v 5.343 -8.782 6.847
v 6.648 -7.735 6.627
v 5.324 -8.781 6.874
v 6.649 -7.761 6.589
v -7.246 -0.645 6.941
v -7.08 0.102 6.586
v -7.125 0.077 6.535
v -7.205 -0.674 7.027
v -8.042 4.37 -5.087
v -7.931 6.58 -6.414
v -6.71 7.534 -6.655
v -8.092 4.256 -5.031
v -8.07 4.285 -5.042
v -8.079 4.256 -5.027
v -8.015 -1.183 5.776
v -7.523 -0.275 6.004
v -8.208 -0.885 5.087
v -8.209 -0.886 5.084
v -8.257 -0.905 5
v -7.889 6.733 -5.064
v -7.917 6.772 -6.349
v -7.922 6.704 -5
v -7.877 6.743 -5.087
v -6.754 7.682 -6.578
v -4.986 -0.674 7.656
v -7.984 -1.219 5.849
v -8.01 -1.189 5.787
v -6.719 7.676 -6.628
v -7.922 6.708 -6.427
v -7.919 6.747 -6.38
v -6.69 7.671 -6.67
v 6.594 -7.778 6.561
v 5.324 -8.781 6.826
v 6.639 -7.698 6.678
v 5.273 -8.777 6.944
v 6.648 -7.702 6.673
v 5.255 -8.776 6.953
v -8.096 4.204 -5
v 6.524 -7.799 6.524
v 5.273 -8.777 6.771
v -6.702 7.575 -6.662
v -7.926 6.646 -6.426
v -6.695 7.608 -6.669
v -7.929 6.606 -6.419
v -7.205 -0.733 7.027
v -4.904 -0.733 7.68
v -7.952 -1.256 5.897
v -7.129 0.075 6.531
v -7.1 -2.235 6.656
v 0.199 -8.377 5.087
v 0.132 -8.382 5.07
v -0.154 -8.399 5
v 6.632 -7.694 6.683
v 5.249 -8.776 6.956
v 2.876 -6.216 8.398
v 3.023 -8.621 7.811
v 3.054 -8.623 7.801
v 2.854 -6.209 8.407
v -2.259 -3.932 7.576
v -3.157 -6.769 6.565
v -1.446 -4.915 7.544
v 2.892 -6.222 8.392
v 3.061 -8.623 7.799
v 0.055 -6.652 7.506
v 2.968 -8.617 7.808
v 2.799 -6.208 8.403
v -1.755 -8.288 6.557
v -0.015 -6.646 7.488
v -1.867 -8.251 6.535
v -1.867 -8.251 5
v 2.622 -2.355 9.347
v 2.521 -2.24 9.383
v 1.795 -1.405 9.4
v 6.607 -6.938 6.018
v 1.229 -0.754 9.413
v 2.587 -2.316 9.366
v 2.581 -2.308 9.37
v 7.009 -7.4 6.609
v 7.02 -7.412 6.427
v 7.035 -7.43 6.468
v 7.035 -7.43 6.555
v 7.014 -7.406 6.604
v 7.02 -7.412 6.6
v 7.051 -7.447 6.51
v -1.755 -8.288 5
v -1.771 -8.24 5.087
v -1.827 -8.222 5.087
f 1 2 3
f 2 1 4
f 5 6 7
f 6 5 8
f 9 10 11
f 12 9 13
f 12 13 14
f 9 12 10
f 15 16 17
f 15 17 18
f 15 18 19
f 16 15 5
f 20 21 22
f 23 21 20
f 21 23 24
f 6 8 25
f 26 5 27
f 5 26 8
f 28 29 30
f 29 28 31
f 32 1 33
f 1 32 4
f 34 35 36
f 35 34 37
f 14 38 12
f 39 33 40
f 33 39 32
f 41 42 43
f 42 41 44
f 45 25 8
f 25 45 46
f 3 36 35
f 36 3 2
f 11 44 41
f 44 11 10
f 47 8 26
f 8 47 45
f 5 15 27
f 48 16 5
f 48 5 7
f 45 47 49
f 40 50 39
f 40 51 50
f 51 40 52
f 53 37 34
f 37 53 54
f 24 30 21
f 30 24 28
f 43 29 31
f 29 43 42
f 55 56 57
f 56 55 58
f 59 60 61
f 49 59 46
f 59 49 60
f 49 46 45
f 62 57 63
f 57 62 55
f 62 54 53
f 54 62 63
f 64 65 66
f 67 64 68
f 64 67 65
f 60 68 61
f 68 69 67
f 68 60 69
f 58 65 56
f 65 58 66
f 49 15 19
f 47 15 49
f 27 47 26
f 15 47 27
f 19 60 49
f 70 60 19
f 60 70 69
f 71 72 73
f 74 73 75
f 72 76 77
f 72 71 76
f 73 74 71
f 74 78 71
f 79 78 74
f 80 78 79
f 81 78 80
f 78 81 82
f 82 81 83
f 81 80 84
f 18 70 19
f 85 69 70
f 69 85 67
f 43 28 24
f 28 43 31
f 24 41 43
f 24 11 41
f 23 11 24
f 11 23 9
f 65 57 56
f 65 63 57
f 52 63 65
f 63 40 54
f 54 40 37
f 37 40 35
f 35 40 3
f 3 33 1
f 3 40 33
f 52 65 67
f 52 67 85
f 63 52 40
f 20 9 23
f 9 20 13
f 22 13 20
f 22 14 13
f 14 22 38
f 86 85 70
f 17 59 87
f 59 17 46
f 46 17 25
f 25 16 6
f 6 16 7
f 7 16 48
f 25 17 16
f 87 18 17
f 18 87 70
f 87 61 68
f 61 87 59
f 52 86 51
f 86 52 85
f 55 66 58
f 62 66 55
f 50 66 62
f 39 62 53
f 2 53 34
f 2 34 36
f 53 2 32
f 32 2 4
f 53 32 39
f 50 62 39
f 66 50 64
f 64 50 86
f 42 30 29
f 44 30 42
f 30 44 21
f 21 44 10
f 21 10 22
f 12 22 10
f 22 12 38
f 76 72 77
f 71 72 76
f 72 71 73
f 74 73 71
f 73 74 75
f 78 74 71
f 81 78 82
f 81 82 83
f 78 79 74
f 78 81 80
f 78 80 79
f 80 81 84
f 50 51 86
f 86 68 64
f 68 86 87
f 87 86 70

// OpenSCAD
// Auto-generated OpenSCAD file

    inner_points = 10*[[0.3549004973467511, -0.35521054808402747, -1.2071067811864837], [-0.30136407955047917, 0.39932030291538634, -1.2071067811866112], [0.3549004973463955, -0.3552105480839295, 1.2071067811866112], [-0.3013640795508348, 0.3993203029154843, 1.2071067811864837], [0.818949629923199, -0.8887444294401406, -0.4999999999998463], [-0.7654132121271353, 0.9328541842715569, -0.5000000000001537], [0.8189496299230516, -0.8887444294401, 0.5000000000001537], [-0.7654132121272826, 0.9328541842715975, 0.4999999999998463], [-0.178633384009495, -0.8192596806605508, -0.4999999999999961], [-0.8348979609067254, -0.06472882966113712, -0.5000000000001235], [-0.17863338400964232, -0.8192596806605101, 0.5000000000000039], [-0.8348979609068726, -0.06472882966109651, 0.49999999999987654]];

    outer_points = 10*[[1.2307668032340542, 0.4303553059775063, 0.08434552661867156], [1.0919099787017486, -0.4303553059775063, 0.574137344382946], [-1.0919099787017486, 0.4303553059775063, -0.574137344382946], [-1.2307668032340542, -0.4303553059775063, -0.08434552661867156], [0.6486571265504295, 1.0389696163301188, -0.4548547567133196], [0.3134270975364759, -1.0389696163301188, 0.7276072924725627], [-0.3134270975364759, 1.0389696163301188, -0.7276072924725627], [-0.6486571265504295, -1.0389696163301188, 0.4548547567133196], [0.3844694278615675, 0.7903395017889528, 0.47701858554126475], [0.24561260332926171, -0.07037111016605979, 0.9668104033055391], [-0.577614796225338, 0.7903395017889528, 0.20426604978202156], [-0.7164716207576437, -0.07037111016605979, 0.6940578675462961]];

    // Convex hull for inner set (I)
    module inner_hull() {
        hull() {
            for (p = inner_points) {
                translate(p) sphere(r=0.1);
            }
        }
    }

    // Convex hull for outer set (O) minus inner hull (O \ I)
    module outer_minus_inner() {
        difference() {
            hull() {
                for (p = outer_points) {
                    translate(p) sphere(r=0.1);
                }
            }
            inner_hull(); // Subtract inner hull
        }
    }

    // Convex hull for outer set (O) minus all translated inner hulls
    module outer_minus_AllTranslationInner() {
        difference() {
            hull() {
                for (p = outer_points) {
                    translate(p) sphere(r=0.1);
                }
            }
            hull() {
                translate([0,0,50]) inner_hull();
                translate([0,0,-50]) inner_hull();
            }; // Subtract translated inner hulls
        }
    }

    // Difference between outer_minus_inner and outer_minus_AllTranslationInner
    module outer_minus_inner_diff() {
        difference() {
            // Outer minus inner
            difference() {
                hull() {
                    for (p = outer_points) {
                        translate(p) sphere(r=0.1);
                    }
                }
                inner_hull();
            }

            // Subtract Outer minus AllTranslationInner
            difference() {
                hull() {
                    for (p = outer_points) {
                        translate(p) sphere(r=0.1);
                    }
                }
                hull() {
                    translate([0,0,50]) inner_hull();
                    translate([0,0,-50]) inner_hull();
                };
            }
        }
    }

    // Rendering all with colors applied
    color([1, 1, 0, 1]) outer_minus_inner_diff(); // Opaque yellow
    
